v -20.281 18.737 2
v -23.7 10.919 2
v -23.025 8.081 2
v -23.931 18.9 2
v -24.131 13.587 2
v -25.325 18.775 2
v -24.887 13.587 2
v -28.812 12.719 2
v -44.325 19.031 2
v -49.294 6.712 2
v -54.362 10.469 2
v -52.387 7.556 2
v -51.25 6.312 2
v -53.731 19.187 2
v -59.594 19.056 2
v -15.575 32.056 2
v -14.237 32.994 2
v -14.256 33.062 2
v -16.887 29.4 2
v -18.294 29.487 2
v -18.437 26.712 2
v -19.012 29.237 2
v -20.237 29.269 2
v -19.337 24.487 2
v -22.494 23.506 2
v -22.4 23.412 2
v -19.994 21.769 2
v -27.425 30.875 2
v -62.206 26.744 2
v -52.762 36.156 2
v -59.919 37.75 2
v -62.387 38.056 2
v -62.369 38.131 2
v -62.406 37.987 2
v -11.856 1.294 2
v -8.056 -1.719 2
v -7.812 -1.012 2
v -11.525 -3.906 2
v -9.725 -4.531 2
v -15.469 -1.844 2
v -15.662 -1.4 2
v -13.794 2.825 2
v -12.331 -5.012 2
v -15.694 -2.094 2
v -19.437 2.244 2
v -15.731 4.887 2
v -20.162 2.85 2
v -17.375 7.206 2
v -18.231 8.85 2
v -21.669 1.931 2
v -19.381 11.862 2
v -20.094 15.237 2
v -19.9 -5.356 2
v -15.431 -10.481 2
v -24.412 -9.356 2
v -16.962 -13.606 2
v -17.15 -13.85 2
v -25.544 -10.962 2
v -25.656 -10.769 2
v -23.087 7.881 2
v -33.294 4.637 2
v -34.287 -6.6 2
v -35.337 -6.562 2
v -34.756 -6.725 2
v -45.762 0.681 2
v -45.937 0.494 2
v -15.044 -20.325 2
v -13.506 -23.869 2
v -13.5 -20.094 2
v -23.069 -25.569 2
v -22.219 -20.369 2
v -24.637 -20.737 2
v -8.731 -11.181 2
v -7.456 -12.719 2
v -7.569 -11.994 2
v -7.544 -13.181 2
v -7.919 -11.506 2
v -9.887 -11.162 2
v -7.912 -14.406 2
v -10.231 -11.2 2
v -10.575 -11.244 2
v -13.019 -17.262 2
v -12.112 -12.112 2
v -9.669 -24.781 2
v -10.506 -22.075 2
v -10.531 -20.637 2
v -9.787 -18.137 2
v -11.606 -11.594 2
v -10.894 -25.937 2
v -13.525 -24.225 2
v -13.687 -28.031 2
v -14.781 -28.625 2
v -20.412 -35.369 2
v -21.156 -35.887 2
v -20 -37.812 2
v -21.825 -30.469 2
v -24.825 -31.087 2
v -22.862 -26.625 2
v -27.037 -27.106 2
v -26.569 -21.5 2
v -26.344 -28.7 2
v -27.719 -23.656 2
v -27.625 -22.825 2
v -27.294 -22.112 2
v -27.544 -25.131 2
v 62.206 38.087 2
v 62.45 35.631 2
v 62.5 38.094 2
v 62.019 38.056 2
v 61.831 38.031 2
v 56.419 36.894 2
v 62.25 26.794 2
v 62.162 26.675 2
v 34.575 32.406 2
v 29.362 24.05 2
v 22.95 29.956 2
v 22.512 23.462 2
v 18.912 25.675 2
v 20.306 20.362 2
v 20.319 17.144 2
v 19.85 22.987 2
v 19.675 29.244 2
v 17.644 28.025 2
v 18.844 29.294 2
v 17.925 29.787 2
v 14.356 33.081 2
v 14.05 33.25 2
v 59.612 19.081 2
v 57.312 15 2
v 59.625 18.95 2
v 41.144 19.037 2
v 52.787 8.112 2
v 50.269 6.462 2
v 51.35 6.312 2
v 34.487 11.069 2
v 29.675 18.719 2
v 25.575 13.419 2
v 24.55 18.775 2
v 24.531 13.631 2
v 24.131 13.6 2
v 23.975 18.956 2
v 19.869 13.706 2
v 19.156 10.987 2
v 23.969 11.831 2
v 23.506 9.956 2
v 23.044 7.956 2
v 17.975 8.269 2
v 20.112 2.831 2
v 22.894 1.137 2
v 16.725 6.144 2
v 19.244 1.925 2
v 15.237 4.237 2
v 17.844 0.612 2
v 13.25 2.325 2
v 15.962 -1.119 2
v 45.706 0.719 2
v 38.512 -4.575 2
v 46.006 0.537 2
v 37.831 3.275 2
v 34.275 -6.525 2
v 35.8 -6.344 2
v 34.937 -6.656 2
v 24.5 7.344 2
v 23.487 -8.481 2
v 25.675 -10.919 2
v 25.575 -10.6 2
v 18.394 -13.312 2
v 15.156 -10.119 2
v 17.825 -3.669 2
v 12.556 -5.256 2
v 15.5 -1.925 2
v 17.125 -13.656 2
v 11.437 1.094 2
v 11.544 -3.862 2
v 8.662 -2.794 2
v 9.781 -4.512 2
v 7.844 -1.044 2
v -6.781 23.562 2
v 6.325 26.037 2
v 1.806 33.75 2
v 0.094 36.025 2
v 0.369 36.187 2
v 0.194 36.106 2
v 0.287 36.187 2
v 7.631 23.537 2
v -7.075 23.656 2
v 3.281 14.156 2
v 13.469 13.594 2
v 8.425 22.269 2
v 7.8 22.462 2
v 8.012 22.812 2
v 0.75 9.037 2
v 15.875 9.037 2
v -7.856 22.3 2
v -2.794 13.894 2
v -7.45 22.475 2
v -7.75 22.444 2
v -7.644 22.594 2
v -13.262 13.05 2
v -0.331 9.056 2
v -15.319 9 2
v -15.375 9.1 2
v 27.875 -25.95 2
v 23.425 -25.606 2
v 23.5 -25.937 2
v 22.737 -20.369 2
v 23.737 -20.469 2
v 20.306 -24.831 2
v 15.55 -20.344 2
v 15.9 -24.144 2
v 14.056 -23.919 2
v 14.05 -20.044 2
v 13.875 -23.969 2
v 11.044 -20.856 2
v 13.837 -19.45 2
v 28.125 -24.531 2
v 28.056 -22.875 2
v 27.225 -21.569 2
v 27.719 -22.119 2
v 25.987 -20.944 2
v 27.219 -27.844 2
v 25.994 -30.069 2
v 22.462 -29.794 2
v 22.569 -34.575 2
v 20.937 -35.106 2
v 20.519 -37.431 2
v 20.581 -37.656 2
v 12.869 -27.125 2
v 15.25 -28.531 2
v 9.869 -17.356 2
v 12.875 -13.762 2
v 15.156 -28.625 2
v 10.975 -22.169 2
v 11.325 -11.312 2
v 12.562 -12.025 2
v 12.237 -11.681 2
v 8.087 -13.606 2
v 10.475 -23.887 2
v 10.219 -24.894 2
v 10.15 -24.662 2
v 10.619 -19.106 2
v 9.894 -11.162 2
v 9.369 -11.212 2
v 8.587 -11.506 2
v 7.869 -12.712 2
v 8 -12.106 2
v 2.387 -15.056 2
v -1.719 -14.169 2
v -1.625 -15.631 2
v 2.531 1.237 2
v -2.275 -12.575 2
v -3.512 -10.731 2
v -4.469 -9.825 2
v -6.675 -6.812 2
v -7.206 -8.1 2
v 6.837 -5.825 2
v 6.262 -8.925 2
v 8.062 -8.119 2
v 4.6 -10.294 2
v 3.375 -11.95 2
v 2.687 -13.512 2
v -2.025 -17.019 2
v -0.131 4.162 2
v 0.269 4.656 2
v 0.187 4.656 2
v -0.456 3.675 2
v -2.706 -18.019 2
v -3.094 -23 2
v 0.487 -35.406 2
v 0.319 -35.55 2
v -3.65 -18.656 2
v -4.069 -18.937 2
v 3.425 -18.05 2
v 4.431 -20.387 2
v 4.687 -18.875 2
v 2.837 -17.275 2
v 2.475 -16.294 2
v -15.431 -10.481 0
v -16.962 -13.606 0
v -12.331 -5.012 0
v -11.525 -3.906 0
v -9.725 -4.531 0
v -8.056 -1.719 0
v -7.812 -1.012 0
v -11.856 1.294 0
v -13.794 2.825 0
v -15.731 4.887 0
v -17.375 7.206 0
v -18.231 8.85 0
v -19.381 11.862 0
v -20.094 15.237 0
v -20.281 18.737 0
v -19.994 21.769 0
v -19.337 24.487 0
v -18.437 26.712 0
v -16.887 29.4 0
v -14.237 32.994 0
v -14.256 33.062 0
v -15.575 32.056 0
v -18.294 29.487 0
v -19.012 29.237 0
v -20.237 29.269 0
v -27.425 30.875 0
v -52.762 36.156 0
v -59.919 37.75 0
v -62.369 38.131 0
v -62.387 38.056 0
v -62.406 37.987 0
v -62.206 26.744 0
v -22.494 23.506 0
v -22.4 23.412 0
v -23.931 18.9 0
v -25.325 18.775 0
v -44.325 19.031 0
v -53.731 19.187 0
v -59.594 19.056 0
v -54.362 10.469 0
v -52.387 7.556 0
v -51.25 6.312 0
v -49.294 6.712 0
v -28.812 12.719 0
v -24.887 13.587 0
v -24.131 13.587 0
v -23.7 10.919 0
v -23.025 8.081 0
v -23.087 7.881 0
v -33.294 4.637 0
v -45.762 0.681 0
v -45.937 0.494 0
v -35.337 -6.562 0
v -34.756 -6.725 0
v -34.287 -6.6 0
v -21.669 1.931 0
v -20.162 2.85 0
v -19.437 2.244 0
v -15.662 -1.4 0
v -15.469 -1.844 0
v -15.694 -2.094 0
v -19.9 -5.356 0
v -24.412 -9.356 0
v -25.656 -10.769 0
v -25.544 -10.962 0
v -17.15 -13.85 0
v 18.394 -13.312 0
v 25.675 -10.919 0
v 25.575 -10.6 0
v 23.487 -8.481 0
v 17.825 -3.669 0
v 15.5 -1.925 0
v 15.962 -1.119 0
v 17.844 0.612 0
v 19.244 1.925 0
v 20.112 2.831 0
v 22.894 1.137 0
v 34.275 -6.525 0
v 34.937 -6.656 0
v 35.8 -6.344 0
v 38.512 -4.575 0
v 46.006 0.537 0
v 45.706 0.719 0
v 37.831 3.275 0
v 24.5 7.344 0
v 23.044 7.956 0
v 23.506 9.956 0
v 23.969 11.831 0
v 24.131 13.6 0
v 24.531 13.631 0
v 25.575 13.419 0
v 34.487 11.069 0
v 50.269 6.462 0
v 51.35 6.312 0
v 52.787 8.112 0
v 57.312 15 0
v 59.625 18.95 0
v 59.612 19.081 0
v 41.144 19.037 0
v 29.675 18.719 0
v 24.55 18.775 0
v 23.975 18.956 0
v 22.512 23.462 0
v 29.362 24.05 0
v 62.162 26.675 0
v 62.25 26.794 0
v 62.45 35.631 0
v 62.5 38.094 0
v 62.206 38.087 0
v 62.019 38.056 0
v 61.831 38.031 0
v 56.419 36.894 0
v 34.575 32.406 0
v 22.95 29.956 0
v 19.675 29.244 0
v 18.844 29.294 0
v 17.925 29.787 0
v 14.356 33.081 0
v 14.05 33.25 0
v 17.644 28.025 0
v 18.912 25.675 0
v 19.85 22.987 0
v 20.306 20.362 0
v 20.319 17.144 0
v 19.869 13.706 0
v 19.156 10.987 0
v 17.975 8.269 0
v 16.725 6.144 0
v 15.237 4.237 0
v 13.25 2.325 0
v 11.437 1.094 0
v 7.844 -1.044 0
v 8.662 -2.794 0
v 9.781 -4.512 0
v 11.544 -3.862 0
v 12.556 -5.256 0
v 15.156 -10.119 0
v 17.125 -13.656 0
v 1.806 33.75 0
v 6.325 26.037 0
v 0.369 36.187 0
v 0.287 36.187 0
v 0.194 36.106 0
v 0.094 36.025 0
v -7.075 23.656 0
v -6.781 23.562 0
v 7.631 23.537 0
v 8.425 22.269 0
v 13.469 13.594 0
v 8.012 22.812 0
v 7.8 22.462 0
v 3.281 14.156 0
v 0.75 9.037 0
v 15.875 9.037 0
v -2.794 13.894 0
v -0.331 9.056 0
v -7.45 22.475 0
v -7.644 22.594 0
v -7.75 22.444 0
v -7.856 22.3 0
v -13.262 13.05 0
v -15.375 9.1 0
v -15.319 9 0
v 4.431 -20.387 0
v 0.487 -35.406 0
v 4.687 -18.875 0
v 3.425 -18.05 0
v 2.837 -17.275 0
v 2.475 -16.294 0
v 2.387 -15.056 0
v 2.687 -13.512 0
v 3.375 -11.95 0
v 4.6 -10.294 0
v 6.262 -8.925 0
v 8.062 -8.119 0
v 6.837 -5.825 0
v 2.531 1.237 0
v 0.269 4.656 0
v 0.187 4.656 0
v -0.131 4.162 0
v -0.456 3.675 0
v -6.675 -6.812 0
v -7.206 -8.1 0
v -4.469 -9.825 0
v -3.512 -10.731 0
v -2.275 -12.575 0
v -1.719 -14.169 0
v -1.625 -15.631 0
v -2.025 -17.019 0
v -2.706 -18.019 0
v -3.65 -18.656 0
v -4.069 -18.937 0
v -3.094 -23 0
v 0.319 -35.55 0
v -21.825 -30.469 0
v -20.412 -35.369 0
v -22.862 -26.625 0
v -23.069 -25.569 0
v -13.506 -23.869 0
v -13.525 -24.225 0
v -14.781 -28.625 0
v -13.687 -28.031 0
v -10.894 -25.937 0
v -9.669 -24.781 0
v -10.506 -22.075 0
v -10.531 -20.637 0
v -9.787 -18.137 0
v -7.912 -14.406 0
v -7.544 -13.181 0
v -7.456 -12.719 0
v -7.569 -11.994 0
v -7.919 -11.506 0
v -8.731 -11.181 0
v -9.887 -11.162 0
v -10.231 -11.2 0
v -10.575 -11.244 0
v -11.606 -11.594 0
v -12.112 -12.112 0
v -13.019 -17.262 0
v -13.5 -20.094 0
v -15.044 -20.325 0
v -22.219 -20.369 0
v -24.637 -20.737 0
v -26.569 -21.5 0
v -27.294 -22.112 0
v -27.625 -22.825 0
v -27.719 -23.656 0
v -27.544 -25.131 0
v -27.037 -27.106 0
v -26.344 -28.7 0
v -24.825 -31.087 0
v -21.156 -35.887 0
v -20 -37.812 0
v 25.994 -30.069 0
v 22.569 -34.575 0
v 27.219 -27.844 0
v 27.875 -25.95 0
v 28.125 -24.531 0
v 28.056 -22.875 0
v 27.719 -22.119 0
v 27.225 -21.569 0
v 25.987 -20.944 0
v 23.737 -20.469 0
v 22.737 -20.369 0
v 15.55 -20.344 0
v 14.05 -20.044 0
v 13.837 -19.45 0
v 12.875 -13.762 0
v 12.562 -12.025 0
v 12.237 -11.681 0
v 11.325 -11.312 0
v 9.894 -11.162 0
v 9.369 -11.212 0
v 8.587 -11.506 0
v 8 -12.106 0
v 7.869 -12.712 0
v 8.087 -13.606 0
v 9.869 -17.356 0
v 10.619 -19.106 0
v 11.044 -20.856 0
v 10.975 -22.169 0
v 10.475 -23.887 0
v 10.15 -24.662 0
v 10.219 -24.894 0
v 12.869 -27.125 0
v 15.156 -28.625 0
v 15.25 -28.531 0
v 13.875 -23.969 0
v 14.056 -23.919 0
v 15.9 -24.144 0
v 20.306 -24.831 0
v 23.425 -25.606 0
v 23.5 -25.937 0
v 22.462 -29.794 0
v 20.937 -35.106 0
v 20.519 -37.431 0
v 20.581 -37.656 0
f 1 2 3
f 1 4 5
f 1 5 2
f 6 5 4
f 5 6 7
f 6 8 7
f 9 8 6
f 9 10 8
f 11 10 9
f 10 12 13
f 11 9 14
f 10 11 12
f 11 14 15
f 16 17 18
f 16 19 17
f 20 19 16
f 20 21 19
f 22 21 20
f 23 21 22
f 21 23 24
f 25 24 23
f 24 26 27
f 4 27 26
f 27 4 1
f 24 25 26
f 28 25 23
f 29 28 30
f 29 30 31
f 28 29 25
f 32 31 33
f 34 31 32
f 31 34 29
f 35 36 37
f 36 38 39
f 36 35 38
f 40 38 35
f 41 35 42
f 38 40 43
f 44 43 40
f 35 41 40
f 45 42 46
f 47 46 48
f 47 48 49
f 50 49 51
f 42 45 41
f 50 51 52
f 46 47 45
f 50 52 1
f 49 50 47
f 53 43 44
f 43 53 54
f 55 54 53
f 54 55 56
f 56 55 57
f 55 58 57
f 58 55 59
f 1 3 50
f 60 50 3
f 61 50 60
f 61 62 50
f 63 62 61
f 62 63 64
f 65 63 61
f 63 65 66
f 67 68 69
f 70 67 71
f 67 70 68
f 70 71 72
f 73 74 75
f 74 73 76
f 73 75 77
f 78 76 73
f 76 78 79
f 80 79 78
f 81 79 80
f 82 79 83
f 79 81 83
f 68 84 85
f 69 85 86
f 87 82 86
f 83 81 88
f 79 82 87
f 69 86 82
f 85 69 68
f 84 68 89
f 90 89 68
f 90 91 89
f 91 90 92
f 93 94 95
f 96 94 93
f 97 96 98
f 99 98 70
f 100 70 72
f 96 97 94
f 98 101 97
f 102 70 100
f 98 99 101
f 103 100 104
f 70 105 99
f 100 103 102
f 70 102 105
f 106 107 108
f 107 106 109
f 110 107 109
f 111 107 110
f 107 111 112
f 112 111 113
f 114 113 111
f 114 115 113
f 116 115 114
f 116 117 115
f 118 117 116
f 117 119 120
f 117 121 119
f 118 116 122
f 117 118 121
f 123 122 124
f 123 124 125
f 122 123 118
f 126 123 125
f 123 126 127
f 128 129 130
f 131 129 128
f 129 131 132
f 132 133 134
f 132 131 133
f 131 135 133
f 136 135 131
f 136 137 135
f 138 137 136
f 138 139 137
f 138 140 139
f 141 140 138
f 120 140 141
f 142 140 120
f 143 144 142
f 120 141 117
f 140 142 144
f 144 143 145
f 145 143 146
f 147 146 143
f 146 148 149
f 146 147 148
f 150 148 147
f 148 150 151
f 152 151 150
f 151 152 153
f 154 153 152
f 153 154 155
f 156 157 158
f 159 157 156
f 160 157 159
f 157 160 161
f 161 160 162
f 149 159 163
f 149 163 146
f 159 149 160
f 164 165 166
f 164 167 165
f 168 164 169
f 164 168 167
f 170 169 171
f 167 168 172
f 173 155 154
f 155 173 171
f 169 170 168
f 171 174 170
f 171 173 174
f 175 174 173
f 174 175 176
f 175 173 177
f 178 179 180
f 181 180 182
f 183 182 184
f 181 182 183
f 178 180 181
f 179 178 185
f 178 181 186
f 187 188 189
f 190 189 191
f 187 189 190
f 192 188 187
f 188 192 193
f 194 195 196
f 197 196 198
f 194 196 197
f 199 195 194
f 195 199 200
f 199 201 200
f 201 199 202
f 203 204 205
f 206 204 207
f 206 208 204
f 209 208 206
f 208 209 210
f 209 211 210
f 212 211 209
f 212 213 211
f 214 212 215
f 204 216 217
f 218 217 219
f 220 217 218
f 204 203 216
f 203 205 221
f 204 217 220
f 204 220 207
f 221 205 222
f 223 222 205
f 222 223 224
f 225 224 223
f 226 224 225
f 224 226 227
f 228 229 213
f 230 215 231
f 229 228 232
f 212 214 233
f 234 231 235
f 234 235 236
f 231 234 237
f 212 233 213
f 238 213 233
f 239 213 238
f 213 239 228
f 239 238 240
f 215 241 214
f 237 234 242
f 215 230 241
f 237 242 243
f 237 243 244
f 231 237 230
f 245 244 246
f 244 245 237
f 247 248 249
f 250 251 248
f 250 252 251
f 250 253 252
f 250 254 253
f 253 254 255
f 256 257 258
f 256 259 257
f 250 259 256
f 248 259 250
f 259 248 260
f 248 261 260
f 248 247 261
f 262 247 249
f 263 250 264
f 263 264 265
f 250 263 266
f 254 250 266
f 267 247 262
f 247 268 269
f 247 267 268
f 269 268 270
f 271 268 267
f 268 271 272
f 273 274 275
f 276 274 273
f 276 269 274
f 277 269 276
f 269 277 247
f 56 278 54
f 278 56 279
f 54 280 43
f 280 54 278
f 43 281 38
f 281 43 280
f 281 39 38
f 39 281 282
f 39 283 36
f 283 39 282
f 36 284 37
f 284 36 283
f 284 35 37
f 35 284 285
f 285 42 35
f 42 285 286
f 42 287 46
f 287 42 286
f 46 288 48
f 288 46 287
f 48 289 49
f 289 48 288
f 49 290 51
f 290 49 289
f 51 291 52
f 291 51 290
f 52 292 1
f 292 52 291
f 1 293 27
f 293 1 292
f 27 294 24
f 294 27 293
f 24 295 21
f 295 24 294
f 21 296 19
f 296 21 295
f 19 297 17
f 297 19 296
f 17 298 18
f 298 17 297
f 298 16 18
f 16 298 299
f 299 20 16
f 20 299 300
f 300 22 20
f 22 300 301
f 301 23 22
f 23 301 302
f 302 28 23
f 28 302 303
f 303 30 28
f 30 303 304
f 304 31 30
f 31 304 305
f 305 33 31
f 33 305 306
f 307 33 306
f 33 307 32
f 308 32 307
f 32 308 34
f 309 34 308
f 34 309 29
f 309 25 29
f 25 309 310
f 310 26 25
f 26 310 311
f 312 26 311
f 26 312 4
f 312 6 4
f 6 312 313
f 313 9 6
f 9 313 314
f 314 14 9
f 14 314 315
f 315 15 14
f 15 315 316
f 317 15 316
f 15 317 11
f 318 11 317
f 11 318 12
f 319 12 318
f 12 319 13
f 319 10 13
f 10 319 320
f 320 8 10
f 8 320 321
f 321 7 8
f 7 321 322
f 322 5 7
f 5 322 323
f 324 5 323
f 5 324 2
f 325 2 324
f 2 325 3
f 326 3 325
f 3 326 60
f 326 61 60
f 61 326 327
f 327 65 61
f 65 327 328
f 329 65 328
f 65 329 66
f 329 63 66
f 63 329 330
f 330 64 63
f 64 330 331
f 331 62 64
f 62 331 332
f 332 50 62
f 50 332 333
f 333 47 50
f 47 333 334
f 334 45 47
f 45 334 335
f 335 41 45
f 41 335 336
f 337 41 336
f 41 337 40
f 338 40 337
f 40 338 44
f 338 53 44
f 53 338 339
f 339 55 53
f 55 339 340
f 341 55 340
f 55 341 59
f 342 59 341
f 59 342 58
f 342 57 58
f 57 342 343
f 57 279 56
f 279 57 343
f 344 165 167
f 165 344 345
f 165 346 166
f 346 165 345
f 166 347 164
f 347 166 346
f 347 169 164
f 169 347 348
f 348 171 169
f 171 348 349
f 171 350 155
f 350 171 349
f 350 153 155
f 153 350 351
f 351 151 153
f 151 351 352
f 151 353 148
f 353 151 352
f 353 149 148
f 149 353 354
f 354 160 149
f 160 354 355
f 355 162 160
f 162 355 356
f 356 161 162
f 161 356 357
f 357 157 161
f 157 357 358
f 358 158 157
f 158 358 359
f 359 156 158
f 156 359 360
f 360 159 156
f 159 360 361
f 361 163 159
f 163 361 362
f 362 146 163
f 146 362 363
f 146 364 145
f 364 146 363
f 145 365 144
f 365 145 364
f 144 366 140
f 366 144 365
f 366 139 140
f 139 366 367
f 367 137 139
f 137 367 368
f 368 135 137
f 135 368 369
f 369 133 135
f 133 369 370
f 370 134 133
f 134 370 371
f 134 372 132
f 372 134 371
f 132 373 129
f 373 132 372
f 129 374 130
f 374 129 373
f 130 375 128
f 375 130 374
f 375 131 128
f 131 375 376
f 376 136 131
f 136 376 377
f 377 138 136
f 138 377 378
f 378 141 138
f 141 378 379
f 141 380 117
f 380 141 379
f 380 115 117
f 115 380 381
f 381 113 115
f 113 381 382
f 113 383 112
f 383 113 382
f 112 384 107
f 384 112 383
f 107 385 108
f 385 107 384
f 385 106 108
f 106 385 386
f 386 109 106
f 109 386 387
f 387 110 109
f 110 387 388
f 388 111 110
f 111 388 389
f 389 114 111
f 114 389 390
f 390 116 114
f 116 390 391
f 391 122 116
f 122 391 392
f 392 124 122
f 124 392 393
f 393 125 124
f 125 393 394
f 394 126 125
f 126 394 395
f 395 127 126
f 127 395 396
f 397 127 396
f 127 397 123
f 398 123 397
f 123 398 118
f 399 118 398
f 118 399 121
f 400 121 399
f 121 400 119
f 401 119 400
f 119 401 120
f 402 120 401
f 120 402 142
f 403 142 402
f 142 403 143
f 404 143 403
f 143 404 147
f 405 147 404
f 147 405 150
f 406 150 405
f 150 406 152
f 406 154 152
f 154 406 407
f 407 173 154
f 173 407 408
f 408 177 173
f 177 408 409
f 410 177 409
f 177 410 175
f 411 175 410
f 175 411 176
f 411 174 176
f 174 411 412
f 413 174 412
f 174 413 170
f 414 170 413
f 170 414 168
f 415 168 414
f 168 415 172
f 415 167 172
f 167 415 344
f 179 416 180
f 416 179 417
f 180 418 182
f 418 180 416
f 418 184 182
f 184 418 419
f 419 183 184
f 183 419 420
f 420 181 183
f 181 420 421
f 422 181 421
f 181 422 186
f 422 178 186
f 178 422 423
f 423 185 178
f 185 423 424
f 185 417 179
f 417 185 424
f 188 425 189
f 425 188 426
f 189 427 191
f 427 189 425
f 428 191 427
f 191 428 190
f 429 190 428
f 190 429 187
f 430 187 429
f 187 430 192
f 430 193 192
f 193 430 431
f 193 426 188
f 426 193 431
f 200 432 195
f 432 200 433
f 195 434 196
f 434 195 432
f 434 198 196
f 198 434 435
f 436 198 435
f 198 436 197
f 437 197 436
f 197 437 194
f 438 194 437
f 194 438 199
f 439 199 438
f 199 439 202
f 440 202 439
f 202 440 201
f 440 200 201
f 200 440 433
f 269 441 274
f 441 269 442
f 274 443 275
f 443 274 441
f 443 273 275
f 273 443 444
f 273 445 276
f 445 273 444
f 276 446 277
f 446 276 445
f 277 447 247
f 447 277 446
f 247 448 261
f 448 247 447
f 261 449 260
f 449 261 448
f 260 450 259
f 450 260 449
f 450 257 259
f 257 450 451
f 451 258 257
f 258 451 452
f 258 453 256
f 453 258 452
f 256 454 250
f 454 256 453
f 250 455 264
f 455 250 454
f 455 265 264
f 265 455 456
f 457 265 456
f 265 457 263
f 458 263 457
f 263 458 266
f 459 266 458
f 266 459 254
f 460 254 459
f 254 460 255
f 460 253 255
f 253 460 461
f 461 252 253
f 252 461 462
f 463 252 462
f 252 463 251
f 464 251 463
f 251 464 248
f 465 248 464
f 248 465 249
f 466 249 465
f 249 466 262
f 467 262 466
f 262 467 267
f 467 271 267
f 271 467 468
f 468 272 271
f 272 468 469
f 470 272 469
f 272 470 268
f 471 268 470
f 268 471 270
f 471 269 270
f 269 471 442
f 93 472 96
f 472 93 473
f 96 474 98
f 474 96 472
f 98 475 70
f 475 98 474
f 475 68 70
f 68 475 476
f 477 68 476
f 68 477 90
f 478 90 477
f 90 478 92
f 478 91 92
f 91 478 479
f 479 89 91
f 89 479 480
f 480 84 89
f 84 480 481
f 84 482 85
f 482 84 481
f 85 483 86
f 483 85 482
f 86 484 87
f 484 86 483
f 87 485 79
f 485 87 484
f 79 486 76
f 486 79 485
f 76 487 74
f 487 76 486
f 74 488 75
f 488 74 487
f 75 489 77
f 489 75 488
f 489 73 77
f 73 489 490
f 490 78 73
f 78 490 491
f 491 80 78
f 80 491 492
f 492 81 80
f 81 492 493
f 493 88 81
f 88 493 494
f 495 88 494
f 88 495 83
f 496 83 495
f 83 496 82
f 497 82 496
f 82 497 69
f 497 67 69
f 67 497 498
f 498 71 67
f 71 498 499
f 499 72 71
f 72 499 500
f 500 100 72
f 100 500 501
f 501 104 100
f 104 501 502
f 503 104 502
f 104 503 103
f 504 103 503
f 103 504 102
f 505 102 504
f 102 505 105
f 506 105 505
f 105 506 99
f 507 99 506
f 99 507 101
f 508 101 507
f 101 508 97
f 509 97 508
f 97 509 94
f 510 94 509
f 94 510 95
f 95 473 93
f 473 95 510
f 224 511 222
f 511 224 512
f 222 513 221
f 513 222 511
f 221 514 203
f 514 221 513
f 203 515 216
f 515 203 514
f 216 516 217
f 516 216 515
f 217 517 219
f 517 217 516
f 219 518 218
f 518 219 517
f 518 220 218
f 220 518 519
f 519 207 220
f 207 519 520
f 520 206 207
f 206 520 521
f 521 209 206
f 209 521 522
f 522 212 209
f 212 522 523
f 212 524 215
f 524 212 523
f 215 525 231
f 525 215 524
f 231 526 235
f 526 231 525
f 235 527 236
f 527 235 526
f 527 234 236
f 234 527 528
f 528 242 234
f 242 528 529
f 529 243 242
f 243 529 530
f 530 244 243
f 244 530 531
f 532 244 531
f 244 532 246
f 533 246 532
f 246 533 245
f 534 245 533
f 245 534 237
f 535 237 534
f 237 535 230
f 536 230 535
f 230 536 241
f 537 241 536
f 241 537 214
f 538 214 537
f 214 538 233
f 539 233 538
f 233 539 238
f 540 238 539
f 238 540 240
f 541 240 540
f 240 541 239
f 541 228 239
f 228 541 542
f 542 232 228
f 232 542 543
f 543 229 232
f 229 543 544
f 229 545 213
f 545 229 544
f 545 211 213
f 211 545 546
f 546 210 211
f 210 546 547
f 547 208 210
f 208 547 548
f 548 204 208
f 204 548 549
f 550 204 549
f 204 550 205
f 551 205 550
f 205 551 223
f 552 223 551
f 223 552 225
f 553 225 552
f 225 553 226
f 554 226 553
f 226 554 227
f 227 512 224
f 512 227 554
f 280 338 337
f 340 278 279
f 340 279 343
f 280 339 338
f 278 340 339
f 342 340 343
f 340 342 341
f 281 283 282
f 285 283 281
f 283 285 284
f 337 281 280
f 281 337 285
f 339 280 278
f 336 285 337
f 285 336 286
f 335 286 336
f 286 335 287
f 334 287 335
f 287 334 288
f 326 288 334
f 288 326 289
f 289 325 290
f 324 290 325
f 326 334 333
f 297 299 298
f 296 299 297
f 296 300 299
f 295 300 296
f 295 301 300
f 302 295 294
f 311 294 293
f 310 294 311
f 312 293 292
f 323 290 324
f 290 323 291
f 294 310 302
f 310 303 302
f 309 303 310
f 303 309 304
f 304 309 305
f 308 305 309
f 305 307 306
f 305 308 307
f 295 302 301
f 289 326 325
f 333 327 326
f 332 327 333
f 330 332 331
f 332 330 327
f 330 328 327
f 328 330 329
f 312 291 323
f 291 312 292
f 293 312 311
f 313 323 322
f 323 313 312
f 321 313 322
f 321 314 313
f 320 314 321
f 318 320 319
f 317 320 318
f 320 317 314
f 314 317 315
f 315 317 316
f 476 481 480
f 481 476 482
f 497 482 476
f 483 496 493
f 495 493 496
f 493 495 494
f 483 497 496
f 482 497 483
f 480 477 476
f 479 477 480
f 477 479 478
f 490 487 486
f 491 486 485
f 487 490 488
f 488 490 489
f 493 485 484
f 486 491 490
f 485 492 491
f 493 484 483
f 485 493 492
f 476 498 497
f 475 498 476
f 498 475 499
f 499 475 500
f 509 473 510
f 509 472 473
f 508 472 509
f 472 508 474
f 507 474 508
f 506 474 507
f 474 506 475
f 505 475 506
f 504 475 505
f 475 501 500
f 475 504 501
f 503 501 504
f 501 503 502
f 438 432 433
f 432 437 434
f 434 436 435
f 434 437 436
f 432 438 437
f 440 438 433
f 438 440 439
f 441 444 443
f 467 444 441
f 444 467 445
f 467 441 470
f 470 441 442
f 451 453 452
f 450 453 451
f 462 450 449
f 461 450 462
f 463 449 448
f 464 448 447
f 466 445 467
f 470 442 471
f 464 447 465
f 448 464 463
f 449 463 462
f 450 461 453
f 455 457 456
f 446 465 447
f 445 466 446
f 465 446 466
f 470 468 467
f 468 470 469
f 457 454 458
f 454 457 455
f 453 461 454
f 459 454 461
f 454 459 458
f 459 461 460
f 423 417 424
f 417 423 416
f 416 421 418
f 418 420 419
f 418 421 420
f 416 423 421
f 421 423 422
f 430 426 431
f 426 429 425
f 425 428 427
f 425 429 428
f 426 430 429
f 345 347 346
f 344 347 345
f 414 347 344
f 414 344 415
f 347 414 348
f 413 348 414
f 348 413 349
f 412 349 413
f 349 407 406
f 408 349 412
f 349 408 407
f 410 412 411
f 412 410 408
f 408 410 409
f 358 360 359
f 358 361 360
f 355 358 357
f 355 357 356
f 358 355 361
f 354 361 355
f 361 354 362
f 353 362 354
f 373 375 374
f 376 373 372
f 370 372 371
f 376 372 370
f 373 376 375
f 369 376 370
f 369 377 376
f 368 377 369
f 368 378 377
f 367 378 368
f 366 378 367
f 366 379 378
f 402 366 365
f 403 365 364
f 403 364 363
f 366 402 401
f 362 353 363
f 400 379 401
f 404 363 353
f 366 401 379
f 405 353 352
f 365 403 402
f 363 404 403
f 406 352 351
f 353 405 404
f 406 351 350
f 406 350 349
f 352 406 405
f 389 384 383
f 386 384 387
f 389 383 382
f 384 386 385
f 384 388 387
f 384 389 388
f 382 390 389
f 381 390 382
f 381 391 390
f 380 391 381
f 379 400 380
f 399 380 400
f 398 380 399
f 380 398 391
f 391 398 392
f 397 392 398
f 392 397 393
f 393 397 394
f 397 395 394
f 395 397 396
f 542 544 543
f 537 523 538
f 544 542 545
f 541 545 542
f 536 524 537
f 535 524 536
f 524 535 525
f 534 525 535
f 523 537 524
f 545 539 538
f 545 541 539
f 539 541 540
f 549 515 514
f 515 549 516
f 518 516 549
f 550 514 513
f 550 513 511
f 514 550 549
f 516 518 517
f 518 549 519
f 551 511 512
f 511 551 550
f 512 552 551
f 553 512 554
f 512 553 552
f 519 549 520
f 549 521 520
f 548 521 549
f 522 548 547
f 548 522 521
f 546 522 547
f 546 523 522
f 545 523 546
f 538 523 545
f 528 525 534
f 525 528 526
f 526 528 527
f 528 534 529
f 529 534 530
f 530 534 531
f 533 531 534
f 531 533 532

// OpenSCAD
module fe5d27e59a608a500e49c35fc8c12df7_1()
{
 /* Generated by trace2scad version 20150415
    http://aggregate.org/MAKE/TRACE2SCAD/
    Optimized model has 279/3844 original points
 */
 color([0.48, 0.48, 0.48])
 assign(minx=0) /* polygon minx=15 */
 assign(miny=0) /* polygon miny=75 */
 assign(maxx=20000) /* polygon maxx=20000 */
 assign(maxy=12250) /* polygon maxy=12226 */
 assign(dx=maxx-minx)
 assign(dy=maxy-miny)
 assign(maxd=((dx>dy)?dx:dy))
 scale([1/maxd, 1/maxd, 1])
 translate([-minx-dx/2, -miny-dy/2, 0])
 linear_extrude(height=1, convexity=279)
 union() {
  union() {
   polygon([[18,12214],[15,12203],[47,10404],[6401,9886],[6416,9871],[6171,9149],[5948,9129],[2908,9170],[1403,9195],[465,9174],[1302,7800],[1618,7334],[1800,7135],[2113,7199],[5390,8160],[6018,8299],[6139,8299],[6208,7872],[6316,7418],[6306,7386],[4673,6867],[2678,6234],[2650,6204],[4346,5075],[4439,5049],[4514,5069],[6533,6434],[6774,6581],[6890,6484],[7494,5901],[7525,5830],[7489,5790],[6816,5268],[6094,4628],[5895,4402],[5913,4371],[7256,3909],[7286,3948],[7531,4448],[8027,5323],[8156,5500],[8444,5400],[8711,5850],[8750,5963],[8103,6332],[7793,6577],[7483,6907],[7220,7278],[7083,7541],[6899,8023],[6785,8563],[6755,9123],[6801,9608],[6906,10043],[7050,10399],[7298,10829],[7722,11404],[7719,11415],[7508,11254],[7073,10843],[6958,10803],[6762,10808],[5612,11065],[1558,11910],[413,12165],[21,12226]], convexity=24);
   polygon([[19923,12214],[19893,12210],[19027,12028],[15532,11310],[13672,10918],[13148,10804],[13015,10812],[12868,10891],[12297,11418],[12248,11445],[12823,10609],[13026,10233],[13176,9803],[13249,9383],[13251,8868],[13179,8318],[13065,7883],[12876,7448],[12676,7108],[12438,6803],[12120,6497],[11830,6300],[11255,5958],[11386,5678],[11565,5403],[11847,5507],[12009,5284],[12425,4506],[12740,3940],[12943,3995],[14108,4378],[14092,4429],[13758,4768],[12852,5538],[12480,5817],[12554,5946],[12855,6223],[13079,6433],[13218,6578],[13663,6307],[15484,5081],[15590,5060],[15728,5110],[16162,5393],[17361,6211],[17313,6240],[16053,6649],[13920,7300],[13687,7398],[13761,7718],[13835,8018],[13861,8301],[13925,8306],[14092,8272],[15518,7896],[18043,7159],[18216,7135],[18446,7423],[19170,8525],[19540,9157],[19538,9178],[16583,9171],[14748,9120],[13928,9129],[13836,9158],[13602,9879],[14698,9973],[19946,10393],[19960,10412],[19992,11826],[20000,12220],[19953,12219]], convexity=23);
   polygon([[10031,11902],[10015,11889],[8868,9910],[8915,9895],[11221,9891],[11012,10291],[10289,11525],[10059,11915],[10046,11915]], convexity=5);
   polygon([[11265,9747],[11248,9719],[10525,8390],[10120,7571],[12540,7571],[12155,8300],[11348,9688],[11282,9775]], convexity=5);
   polygon([[8760,9716],[8743,9693],[7878,8213],[7540,7581],[7549,7565],[9947,7574],[9553,8348],[8808,9721],[8777,9740]], convexity=6);
   polygon([[9979,6791],[9927,6713],[8932,5035],[8847,4829],[9285,4553],[9438,4408],[9636,4113],[9725,3858],[9740,3624],[9676,3402],[9567,3242],[9416,3140],[9349,3095],[9505,2445],[10051,437],[10078,460],[10709,2863],[10750,3105],[10548,3237],[10454,3361],[10396,3518],[10382,3716],[10430,3963],[10540,4213],[10736,4478],[11002,4697],[11290,4826],[11094,5193],[10405,6323],[10043,6870],[10030,6870]], convexity=10);
   polygon([[8363,4333],[8308,4326],[8143,4270],[8062,4187],[7917,3363],[7840,2910],[7593,2873],[6445,2866],[6058,2807],[5749,2685],[5633,2587],[5580,2473],[5565,2340],[5593,2104],[5674,1788],[5785,1533],[6028,1151],[6615,383],[6800,75],[6734,466],[6508,1250],[6342,1865],[6309,2034],[7839,2306],[7836,2249],[7635,1545],[7810,1640],[8257,1975],[8453,2160],[8319,2593],[8315,2823],[8434,3223],[8734,3820],[8793,4016],[8807,4090],[8789,4206],[8733,4284],[8603,4336],[8418,4339]], convexity=11);
   polygon([[11541,4335],[11499,4331],[11374,4284],[11280,4188],[11259,4091],[11294,3948],[11579,3348],[11699,3068],[11767,2788],[11756,2578],[11676,2303],[11624,2179],[11635,2142],[12059,1785],[12425,1545],[12440,1560],[12220,2290],[12249,2298],[12544,2262],[13249,2152],[13748,2028],[13760,1975],[13594,1358],[13350,508],[13283,136],[13293,100],[13611,593],[14159,1314],[14355,1670],[14460,1973],[14500,2200],[14489,2465],[14435,2586],[14356,2674],[14158,2774],[13798,2850],[13638,2866],[12488,2870],[12248,2918],[12214,3013],[12060,3923],[12010,4201],[11958,4256],[11812,4315],[11583,4339]], convexity=14);
  }
 }
}

module fe5d27e59a608a500e49c35fc8c12df7()
{
 /* all layers combined, scaled to within a 1mm cube */
 scale([1, 1, 1/1])
 difference() {
  union() {
   scale([1,1,2]) translate([0,0,-0.5]) fe5d27e59a608a500e49c35fc8c12df7_1();
  }
  translate([0,0,-2]) cube([2,2,4],center=true);
 }
}

scale([125, 125, 2]) {
	fe5d27e59a608a500e49c35fc8c12df7();
}
